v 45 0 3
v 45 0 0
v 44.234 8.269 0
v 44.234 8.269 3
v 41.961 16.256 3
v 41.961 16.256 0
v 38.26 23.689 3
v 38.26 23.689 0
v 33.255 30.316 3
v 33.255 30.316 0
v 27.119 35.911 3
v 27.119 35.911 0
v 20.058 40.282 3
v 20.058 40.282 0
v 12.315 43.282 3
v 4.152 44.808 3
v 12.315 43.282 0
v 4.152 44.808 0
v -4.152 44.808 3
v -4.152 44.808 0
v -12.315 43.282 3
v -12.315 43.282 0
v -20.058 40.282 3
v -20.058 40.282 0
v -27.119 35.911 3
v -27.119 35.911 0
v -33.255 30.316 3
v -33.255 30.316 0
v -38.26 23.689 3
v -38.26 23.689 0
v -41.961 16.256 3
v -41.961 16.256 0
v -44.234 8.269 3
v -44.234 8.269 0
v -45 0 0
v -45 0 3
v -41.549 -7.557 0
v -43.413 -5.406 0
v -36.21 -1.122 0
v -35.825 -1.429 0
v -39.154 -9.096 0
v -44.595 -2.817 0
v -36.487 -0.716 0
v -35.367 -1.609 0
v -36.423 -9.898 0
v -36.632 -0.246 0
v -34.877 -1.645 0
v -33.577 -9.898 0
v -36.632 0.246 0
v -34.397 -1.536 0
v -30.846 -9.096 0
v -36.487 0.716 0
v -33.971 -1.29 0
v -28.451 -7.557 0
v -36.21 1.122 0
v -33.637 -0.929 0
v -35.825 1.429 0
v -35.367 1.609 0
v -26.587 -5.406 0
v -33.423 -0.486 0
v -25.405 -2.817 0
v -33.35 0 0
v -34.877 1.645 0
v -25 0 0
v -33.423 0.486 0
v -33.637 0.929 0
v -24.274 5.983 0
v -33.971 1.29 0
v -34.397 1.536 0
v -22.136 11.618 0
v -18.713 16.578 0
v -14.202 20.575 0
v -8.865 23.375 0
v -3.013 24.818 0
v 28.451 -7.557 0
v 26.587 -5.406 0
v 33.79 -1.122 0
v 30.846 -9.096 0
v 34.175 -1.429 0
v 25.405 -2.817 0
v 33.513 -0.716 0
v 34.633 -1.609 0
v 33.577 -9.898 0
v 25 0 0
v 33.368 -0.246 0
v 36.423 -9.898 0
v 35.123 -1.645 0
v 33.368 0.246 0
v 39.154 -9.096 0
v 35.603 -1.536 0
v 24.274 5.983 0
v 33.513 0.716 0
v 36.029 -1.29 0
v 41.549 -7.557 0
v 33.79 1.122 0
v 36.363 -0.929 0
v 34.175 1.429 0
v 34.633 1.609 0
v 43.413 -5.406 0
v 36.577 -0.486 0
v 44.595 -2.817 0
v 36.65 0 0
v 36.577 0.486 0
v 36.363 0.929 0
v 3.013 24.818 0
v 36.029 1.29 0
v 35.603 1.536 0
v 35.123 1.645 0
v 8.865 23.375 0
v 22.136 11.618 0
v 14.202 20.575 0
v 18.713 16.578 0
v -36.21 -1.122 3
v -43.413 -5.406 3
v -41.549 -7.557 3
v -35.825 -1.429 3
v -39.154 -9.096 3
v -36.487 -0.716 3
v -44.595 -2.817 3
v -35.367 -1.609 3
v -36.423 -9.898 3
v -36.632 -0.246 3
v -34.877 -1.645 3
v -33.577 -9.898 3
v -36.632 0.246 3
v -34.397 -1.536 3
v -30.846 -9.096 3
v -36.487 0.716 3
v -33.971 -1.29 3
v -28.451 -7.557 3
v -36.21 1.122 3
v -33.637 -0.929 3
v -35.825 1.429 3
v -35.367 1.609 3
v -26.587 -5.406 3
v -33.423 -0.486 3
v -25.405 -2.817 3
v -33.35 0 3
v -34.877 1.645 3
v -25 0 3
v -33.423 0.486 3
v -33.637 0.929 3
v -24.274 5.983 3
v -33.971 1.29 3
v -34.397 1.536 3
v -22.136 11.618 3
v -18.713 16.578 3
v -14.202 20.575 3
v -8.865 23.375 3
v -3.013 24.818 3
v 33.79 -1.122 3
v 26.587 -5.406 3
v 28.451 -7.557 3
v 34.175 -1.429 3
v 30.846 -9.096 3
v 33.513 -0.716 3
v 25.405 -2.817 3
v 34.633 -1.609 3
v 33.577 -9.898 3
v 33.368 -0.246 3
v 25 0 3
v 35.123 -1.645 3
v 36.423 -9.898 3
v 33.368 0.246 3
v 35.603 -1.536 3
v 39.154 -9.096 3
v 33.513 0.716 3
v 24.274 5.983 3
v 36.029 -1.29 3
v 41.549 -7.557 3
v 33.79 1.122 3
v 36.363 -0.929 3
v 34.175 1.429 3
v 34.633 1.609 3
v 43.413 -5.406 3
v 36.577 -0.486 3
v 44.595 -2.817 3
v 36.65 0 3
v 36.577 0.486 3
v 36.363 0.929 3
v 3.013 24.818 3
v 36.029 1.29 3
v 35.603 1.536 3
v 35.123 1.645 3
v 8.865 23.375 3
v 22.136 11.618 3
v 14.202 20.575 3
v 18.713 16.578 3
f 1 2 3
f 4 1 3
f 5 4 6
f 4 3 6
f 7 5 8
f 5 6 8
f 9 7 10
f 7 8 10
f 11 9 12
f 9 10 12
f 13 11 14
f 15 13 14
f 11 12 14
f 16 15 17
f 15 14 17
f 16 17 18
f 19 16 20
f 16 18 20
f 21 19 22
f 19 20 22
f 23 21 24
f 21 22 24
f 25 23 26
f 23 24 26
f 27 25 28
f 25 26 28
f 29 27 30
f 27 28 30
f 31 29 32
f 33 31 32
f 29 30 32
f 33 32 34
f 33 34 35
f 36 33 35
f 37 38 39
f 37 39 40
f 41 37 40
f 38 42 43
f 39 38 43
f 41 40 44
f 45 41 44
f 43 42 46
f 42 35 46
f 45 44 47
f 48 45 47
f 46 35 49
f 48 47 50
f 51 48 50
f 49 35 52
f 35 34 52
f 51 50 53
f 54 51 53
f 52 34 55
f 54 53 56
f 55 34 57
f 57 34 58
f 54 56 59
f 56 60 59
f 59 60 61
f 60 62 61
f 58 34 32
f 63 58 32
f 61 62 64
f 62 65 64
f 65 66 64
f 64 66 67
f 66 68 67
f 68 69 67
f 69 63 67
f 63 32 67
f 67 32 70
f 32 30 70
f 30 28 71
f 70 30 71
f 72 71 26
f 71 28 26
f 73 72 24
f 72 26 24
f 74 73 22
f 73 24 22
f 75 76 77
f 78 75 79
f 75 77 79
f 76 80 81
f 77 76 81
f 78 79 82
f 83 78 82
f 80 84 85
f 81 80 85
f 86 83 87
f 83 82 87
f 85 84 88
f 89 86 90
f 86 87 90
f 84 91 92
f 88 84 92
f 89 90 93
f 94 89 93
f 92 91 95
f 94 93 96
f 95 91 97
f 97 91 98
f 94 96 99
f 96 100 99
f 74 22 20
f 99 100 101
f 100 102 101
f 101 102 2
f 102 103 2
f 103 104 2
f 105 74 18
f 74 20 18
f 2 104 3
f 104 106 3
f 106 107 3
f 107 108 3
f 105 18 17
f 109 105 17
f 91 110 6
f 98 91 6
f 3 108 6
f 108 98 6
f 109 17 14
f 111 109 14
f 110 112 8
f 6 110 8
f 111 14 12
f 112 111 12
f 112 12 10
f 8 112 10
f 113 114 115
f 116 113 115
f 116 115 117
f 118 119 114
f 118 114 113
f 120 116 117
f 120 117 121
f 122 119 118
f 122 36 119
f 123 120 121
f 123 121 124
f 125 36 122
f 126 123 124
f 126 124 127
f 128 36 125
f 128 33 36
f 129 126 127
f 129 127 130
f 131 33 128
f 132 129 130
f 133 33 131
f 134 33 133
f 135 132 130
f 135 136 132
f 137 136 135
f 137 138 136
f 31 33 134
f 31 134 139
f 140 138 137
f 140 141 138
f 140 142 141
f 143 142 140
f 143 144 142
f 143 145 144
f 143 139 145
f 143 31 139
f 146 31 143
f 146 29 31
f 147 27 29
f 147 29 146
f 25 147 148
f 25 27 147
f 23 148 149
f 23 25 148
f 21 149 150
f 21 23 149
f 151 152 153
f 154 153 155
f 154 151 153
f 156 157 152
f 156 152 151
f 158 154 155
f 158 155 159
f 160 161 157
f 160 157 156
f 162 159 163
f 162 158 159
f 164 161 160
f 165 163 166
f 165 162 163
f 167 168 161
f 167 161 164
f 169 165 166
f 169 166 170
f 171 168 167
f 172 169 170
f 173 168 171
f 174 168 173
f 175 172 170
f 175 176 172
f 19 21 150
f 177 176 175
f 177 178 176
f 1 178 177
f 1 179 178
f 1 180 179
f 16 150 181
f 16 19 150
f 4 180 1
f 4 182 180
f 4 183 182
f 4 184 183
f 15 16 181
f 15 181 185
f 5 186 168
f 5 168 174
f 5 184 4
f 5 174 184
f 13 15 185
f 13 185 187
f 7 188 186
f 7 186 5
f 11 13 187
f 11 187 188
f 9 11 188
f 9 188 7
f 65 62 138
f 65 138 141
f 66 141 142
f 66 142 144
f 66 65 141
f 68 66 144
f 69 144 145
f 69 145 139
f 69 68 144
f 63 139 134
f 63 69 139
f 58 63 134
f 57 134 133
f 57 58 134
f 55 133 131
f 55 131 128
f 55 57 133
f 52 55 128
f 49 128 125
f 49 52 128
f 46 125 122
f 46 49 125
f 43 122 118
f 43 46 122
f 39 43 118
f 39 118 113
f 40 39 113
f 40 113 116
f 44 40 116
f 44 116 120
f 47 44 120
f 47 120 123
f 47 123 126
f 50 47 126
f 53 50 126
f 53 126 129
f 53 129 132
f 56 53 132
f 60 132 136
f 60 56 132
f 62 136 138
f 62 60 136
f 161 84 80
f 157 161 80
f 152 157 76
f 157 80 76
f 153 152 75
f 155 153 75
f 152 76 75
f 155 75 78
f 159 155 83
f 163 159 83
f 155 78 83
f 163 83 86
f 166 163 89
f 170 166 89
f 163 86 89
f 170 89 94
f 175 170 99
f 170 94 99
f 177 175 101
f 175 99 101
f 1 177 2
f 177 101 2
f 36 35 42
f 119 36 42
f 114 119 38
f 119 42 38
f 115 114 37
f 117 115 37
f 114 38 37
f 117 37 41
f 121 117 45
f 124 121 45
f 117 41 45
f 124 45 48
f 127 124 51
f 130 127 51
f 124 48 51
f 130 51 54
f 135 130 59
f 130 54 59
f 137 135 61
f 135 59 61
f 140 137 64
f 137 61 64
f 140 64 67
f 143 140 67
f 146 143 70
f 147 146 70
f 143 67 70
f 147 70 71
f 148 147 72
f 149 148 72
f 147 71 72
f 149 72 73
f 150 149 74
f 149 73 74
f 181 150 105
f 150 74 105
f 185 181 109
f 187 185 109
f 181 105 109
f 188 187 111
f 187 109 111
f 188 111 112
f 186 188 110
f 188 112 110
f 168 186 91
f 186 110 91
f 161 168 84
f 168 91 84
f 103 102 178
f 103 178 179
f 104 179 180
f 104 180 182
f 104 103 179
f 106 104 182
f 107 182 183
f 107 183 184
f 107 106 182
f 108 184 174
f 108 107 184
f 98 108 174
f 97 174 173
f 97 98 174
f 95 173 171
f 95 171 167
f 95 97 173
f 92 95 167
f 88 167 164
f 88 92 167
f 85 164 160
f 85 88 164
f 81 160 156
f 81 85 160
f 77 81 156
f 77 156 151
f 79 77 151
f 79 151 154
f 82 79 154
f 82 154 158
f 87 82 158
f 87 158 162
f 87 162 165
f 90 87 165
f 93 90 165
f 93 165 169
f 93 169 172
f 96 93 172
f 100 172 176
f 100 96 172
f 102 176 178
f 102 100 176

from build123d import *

# Parameters (mm, degrees)
SKETCH_1_R      = 1.65
EXTRUDE_1_DEPTH = 3


with BuildPart() as part:
    # 草图1 → 凸台-拉伸1 (new body)
    with BuildSketch(Plane.XY):
        with BuildLine():
            ThreePointArc((-25, 0), (0, 25), (25, 0))
            ThreePointArc((25, 0), (35, -10), (45, 0))
            ThreePointArc((45, 0), (0, 45), (-45, 0))
            ThreePointArc((-45, 0), (-35, -10), (-25, 0))
        make_face()
        with Locations((-35, 0)):
            Circle(SKETCH_1_R, mode=Mode.SUBTRACT)
        with Locations((35, 0)):
            Circle(SKETCH_1_R, mode=Mode.SUBTRACT)
    extrude(amount=EXTRUDE_1_DEPTH)


solid = part.part
